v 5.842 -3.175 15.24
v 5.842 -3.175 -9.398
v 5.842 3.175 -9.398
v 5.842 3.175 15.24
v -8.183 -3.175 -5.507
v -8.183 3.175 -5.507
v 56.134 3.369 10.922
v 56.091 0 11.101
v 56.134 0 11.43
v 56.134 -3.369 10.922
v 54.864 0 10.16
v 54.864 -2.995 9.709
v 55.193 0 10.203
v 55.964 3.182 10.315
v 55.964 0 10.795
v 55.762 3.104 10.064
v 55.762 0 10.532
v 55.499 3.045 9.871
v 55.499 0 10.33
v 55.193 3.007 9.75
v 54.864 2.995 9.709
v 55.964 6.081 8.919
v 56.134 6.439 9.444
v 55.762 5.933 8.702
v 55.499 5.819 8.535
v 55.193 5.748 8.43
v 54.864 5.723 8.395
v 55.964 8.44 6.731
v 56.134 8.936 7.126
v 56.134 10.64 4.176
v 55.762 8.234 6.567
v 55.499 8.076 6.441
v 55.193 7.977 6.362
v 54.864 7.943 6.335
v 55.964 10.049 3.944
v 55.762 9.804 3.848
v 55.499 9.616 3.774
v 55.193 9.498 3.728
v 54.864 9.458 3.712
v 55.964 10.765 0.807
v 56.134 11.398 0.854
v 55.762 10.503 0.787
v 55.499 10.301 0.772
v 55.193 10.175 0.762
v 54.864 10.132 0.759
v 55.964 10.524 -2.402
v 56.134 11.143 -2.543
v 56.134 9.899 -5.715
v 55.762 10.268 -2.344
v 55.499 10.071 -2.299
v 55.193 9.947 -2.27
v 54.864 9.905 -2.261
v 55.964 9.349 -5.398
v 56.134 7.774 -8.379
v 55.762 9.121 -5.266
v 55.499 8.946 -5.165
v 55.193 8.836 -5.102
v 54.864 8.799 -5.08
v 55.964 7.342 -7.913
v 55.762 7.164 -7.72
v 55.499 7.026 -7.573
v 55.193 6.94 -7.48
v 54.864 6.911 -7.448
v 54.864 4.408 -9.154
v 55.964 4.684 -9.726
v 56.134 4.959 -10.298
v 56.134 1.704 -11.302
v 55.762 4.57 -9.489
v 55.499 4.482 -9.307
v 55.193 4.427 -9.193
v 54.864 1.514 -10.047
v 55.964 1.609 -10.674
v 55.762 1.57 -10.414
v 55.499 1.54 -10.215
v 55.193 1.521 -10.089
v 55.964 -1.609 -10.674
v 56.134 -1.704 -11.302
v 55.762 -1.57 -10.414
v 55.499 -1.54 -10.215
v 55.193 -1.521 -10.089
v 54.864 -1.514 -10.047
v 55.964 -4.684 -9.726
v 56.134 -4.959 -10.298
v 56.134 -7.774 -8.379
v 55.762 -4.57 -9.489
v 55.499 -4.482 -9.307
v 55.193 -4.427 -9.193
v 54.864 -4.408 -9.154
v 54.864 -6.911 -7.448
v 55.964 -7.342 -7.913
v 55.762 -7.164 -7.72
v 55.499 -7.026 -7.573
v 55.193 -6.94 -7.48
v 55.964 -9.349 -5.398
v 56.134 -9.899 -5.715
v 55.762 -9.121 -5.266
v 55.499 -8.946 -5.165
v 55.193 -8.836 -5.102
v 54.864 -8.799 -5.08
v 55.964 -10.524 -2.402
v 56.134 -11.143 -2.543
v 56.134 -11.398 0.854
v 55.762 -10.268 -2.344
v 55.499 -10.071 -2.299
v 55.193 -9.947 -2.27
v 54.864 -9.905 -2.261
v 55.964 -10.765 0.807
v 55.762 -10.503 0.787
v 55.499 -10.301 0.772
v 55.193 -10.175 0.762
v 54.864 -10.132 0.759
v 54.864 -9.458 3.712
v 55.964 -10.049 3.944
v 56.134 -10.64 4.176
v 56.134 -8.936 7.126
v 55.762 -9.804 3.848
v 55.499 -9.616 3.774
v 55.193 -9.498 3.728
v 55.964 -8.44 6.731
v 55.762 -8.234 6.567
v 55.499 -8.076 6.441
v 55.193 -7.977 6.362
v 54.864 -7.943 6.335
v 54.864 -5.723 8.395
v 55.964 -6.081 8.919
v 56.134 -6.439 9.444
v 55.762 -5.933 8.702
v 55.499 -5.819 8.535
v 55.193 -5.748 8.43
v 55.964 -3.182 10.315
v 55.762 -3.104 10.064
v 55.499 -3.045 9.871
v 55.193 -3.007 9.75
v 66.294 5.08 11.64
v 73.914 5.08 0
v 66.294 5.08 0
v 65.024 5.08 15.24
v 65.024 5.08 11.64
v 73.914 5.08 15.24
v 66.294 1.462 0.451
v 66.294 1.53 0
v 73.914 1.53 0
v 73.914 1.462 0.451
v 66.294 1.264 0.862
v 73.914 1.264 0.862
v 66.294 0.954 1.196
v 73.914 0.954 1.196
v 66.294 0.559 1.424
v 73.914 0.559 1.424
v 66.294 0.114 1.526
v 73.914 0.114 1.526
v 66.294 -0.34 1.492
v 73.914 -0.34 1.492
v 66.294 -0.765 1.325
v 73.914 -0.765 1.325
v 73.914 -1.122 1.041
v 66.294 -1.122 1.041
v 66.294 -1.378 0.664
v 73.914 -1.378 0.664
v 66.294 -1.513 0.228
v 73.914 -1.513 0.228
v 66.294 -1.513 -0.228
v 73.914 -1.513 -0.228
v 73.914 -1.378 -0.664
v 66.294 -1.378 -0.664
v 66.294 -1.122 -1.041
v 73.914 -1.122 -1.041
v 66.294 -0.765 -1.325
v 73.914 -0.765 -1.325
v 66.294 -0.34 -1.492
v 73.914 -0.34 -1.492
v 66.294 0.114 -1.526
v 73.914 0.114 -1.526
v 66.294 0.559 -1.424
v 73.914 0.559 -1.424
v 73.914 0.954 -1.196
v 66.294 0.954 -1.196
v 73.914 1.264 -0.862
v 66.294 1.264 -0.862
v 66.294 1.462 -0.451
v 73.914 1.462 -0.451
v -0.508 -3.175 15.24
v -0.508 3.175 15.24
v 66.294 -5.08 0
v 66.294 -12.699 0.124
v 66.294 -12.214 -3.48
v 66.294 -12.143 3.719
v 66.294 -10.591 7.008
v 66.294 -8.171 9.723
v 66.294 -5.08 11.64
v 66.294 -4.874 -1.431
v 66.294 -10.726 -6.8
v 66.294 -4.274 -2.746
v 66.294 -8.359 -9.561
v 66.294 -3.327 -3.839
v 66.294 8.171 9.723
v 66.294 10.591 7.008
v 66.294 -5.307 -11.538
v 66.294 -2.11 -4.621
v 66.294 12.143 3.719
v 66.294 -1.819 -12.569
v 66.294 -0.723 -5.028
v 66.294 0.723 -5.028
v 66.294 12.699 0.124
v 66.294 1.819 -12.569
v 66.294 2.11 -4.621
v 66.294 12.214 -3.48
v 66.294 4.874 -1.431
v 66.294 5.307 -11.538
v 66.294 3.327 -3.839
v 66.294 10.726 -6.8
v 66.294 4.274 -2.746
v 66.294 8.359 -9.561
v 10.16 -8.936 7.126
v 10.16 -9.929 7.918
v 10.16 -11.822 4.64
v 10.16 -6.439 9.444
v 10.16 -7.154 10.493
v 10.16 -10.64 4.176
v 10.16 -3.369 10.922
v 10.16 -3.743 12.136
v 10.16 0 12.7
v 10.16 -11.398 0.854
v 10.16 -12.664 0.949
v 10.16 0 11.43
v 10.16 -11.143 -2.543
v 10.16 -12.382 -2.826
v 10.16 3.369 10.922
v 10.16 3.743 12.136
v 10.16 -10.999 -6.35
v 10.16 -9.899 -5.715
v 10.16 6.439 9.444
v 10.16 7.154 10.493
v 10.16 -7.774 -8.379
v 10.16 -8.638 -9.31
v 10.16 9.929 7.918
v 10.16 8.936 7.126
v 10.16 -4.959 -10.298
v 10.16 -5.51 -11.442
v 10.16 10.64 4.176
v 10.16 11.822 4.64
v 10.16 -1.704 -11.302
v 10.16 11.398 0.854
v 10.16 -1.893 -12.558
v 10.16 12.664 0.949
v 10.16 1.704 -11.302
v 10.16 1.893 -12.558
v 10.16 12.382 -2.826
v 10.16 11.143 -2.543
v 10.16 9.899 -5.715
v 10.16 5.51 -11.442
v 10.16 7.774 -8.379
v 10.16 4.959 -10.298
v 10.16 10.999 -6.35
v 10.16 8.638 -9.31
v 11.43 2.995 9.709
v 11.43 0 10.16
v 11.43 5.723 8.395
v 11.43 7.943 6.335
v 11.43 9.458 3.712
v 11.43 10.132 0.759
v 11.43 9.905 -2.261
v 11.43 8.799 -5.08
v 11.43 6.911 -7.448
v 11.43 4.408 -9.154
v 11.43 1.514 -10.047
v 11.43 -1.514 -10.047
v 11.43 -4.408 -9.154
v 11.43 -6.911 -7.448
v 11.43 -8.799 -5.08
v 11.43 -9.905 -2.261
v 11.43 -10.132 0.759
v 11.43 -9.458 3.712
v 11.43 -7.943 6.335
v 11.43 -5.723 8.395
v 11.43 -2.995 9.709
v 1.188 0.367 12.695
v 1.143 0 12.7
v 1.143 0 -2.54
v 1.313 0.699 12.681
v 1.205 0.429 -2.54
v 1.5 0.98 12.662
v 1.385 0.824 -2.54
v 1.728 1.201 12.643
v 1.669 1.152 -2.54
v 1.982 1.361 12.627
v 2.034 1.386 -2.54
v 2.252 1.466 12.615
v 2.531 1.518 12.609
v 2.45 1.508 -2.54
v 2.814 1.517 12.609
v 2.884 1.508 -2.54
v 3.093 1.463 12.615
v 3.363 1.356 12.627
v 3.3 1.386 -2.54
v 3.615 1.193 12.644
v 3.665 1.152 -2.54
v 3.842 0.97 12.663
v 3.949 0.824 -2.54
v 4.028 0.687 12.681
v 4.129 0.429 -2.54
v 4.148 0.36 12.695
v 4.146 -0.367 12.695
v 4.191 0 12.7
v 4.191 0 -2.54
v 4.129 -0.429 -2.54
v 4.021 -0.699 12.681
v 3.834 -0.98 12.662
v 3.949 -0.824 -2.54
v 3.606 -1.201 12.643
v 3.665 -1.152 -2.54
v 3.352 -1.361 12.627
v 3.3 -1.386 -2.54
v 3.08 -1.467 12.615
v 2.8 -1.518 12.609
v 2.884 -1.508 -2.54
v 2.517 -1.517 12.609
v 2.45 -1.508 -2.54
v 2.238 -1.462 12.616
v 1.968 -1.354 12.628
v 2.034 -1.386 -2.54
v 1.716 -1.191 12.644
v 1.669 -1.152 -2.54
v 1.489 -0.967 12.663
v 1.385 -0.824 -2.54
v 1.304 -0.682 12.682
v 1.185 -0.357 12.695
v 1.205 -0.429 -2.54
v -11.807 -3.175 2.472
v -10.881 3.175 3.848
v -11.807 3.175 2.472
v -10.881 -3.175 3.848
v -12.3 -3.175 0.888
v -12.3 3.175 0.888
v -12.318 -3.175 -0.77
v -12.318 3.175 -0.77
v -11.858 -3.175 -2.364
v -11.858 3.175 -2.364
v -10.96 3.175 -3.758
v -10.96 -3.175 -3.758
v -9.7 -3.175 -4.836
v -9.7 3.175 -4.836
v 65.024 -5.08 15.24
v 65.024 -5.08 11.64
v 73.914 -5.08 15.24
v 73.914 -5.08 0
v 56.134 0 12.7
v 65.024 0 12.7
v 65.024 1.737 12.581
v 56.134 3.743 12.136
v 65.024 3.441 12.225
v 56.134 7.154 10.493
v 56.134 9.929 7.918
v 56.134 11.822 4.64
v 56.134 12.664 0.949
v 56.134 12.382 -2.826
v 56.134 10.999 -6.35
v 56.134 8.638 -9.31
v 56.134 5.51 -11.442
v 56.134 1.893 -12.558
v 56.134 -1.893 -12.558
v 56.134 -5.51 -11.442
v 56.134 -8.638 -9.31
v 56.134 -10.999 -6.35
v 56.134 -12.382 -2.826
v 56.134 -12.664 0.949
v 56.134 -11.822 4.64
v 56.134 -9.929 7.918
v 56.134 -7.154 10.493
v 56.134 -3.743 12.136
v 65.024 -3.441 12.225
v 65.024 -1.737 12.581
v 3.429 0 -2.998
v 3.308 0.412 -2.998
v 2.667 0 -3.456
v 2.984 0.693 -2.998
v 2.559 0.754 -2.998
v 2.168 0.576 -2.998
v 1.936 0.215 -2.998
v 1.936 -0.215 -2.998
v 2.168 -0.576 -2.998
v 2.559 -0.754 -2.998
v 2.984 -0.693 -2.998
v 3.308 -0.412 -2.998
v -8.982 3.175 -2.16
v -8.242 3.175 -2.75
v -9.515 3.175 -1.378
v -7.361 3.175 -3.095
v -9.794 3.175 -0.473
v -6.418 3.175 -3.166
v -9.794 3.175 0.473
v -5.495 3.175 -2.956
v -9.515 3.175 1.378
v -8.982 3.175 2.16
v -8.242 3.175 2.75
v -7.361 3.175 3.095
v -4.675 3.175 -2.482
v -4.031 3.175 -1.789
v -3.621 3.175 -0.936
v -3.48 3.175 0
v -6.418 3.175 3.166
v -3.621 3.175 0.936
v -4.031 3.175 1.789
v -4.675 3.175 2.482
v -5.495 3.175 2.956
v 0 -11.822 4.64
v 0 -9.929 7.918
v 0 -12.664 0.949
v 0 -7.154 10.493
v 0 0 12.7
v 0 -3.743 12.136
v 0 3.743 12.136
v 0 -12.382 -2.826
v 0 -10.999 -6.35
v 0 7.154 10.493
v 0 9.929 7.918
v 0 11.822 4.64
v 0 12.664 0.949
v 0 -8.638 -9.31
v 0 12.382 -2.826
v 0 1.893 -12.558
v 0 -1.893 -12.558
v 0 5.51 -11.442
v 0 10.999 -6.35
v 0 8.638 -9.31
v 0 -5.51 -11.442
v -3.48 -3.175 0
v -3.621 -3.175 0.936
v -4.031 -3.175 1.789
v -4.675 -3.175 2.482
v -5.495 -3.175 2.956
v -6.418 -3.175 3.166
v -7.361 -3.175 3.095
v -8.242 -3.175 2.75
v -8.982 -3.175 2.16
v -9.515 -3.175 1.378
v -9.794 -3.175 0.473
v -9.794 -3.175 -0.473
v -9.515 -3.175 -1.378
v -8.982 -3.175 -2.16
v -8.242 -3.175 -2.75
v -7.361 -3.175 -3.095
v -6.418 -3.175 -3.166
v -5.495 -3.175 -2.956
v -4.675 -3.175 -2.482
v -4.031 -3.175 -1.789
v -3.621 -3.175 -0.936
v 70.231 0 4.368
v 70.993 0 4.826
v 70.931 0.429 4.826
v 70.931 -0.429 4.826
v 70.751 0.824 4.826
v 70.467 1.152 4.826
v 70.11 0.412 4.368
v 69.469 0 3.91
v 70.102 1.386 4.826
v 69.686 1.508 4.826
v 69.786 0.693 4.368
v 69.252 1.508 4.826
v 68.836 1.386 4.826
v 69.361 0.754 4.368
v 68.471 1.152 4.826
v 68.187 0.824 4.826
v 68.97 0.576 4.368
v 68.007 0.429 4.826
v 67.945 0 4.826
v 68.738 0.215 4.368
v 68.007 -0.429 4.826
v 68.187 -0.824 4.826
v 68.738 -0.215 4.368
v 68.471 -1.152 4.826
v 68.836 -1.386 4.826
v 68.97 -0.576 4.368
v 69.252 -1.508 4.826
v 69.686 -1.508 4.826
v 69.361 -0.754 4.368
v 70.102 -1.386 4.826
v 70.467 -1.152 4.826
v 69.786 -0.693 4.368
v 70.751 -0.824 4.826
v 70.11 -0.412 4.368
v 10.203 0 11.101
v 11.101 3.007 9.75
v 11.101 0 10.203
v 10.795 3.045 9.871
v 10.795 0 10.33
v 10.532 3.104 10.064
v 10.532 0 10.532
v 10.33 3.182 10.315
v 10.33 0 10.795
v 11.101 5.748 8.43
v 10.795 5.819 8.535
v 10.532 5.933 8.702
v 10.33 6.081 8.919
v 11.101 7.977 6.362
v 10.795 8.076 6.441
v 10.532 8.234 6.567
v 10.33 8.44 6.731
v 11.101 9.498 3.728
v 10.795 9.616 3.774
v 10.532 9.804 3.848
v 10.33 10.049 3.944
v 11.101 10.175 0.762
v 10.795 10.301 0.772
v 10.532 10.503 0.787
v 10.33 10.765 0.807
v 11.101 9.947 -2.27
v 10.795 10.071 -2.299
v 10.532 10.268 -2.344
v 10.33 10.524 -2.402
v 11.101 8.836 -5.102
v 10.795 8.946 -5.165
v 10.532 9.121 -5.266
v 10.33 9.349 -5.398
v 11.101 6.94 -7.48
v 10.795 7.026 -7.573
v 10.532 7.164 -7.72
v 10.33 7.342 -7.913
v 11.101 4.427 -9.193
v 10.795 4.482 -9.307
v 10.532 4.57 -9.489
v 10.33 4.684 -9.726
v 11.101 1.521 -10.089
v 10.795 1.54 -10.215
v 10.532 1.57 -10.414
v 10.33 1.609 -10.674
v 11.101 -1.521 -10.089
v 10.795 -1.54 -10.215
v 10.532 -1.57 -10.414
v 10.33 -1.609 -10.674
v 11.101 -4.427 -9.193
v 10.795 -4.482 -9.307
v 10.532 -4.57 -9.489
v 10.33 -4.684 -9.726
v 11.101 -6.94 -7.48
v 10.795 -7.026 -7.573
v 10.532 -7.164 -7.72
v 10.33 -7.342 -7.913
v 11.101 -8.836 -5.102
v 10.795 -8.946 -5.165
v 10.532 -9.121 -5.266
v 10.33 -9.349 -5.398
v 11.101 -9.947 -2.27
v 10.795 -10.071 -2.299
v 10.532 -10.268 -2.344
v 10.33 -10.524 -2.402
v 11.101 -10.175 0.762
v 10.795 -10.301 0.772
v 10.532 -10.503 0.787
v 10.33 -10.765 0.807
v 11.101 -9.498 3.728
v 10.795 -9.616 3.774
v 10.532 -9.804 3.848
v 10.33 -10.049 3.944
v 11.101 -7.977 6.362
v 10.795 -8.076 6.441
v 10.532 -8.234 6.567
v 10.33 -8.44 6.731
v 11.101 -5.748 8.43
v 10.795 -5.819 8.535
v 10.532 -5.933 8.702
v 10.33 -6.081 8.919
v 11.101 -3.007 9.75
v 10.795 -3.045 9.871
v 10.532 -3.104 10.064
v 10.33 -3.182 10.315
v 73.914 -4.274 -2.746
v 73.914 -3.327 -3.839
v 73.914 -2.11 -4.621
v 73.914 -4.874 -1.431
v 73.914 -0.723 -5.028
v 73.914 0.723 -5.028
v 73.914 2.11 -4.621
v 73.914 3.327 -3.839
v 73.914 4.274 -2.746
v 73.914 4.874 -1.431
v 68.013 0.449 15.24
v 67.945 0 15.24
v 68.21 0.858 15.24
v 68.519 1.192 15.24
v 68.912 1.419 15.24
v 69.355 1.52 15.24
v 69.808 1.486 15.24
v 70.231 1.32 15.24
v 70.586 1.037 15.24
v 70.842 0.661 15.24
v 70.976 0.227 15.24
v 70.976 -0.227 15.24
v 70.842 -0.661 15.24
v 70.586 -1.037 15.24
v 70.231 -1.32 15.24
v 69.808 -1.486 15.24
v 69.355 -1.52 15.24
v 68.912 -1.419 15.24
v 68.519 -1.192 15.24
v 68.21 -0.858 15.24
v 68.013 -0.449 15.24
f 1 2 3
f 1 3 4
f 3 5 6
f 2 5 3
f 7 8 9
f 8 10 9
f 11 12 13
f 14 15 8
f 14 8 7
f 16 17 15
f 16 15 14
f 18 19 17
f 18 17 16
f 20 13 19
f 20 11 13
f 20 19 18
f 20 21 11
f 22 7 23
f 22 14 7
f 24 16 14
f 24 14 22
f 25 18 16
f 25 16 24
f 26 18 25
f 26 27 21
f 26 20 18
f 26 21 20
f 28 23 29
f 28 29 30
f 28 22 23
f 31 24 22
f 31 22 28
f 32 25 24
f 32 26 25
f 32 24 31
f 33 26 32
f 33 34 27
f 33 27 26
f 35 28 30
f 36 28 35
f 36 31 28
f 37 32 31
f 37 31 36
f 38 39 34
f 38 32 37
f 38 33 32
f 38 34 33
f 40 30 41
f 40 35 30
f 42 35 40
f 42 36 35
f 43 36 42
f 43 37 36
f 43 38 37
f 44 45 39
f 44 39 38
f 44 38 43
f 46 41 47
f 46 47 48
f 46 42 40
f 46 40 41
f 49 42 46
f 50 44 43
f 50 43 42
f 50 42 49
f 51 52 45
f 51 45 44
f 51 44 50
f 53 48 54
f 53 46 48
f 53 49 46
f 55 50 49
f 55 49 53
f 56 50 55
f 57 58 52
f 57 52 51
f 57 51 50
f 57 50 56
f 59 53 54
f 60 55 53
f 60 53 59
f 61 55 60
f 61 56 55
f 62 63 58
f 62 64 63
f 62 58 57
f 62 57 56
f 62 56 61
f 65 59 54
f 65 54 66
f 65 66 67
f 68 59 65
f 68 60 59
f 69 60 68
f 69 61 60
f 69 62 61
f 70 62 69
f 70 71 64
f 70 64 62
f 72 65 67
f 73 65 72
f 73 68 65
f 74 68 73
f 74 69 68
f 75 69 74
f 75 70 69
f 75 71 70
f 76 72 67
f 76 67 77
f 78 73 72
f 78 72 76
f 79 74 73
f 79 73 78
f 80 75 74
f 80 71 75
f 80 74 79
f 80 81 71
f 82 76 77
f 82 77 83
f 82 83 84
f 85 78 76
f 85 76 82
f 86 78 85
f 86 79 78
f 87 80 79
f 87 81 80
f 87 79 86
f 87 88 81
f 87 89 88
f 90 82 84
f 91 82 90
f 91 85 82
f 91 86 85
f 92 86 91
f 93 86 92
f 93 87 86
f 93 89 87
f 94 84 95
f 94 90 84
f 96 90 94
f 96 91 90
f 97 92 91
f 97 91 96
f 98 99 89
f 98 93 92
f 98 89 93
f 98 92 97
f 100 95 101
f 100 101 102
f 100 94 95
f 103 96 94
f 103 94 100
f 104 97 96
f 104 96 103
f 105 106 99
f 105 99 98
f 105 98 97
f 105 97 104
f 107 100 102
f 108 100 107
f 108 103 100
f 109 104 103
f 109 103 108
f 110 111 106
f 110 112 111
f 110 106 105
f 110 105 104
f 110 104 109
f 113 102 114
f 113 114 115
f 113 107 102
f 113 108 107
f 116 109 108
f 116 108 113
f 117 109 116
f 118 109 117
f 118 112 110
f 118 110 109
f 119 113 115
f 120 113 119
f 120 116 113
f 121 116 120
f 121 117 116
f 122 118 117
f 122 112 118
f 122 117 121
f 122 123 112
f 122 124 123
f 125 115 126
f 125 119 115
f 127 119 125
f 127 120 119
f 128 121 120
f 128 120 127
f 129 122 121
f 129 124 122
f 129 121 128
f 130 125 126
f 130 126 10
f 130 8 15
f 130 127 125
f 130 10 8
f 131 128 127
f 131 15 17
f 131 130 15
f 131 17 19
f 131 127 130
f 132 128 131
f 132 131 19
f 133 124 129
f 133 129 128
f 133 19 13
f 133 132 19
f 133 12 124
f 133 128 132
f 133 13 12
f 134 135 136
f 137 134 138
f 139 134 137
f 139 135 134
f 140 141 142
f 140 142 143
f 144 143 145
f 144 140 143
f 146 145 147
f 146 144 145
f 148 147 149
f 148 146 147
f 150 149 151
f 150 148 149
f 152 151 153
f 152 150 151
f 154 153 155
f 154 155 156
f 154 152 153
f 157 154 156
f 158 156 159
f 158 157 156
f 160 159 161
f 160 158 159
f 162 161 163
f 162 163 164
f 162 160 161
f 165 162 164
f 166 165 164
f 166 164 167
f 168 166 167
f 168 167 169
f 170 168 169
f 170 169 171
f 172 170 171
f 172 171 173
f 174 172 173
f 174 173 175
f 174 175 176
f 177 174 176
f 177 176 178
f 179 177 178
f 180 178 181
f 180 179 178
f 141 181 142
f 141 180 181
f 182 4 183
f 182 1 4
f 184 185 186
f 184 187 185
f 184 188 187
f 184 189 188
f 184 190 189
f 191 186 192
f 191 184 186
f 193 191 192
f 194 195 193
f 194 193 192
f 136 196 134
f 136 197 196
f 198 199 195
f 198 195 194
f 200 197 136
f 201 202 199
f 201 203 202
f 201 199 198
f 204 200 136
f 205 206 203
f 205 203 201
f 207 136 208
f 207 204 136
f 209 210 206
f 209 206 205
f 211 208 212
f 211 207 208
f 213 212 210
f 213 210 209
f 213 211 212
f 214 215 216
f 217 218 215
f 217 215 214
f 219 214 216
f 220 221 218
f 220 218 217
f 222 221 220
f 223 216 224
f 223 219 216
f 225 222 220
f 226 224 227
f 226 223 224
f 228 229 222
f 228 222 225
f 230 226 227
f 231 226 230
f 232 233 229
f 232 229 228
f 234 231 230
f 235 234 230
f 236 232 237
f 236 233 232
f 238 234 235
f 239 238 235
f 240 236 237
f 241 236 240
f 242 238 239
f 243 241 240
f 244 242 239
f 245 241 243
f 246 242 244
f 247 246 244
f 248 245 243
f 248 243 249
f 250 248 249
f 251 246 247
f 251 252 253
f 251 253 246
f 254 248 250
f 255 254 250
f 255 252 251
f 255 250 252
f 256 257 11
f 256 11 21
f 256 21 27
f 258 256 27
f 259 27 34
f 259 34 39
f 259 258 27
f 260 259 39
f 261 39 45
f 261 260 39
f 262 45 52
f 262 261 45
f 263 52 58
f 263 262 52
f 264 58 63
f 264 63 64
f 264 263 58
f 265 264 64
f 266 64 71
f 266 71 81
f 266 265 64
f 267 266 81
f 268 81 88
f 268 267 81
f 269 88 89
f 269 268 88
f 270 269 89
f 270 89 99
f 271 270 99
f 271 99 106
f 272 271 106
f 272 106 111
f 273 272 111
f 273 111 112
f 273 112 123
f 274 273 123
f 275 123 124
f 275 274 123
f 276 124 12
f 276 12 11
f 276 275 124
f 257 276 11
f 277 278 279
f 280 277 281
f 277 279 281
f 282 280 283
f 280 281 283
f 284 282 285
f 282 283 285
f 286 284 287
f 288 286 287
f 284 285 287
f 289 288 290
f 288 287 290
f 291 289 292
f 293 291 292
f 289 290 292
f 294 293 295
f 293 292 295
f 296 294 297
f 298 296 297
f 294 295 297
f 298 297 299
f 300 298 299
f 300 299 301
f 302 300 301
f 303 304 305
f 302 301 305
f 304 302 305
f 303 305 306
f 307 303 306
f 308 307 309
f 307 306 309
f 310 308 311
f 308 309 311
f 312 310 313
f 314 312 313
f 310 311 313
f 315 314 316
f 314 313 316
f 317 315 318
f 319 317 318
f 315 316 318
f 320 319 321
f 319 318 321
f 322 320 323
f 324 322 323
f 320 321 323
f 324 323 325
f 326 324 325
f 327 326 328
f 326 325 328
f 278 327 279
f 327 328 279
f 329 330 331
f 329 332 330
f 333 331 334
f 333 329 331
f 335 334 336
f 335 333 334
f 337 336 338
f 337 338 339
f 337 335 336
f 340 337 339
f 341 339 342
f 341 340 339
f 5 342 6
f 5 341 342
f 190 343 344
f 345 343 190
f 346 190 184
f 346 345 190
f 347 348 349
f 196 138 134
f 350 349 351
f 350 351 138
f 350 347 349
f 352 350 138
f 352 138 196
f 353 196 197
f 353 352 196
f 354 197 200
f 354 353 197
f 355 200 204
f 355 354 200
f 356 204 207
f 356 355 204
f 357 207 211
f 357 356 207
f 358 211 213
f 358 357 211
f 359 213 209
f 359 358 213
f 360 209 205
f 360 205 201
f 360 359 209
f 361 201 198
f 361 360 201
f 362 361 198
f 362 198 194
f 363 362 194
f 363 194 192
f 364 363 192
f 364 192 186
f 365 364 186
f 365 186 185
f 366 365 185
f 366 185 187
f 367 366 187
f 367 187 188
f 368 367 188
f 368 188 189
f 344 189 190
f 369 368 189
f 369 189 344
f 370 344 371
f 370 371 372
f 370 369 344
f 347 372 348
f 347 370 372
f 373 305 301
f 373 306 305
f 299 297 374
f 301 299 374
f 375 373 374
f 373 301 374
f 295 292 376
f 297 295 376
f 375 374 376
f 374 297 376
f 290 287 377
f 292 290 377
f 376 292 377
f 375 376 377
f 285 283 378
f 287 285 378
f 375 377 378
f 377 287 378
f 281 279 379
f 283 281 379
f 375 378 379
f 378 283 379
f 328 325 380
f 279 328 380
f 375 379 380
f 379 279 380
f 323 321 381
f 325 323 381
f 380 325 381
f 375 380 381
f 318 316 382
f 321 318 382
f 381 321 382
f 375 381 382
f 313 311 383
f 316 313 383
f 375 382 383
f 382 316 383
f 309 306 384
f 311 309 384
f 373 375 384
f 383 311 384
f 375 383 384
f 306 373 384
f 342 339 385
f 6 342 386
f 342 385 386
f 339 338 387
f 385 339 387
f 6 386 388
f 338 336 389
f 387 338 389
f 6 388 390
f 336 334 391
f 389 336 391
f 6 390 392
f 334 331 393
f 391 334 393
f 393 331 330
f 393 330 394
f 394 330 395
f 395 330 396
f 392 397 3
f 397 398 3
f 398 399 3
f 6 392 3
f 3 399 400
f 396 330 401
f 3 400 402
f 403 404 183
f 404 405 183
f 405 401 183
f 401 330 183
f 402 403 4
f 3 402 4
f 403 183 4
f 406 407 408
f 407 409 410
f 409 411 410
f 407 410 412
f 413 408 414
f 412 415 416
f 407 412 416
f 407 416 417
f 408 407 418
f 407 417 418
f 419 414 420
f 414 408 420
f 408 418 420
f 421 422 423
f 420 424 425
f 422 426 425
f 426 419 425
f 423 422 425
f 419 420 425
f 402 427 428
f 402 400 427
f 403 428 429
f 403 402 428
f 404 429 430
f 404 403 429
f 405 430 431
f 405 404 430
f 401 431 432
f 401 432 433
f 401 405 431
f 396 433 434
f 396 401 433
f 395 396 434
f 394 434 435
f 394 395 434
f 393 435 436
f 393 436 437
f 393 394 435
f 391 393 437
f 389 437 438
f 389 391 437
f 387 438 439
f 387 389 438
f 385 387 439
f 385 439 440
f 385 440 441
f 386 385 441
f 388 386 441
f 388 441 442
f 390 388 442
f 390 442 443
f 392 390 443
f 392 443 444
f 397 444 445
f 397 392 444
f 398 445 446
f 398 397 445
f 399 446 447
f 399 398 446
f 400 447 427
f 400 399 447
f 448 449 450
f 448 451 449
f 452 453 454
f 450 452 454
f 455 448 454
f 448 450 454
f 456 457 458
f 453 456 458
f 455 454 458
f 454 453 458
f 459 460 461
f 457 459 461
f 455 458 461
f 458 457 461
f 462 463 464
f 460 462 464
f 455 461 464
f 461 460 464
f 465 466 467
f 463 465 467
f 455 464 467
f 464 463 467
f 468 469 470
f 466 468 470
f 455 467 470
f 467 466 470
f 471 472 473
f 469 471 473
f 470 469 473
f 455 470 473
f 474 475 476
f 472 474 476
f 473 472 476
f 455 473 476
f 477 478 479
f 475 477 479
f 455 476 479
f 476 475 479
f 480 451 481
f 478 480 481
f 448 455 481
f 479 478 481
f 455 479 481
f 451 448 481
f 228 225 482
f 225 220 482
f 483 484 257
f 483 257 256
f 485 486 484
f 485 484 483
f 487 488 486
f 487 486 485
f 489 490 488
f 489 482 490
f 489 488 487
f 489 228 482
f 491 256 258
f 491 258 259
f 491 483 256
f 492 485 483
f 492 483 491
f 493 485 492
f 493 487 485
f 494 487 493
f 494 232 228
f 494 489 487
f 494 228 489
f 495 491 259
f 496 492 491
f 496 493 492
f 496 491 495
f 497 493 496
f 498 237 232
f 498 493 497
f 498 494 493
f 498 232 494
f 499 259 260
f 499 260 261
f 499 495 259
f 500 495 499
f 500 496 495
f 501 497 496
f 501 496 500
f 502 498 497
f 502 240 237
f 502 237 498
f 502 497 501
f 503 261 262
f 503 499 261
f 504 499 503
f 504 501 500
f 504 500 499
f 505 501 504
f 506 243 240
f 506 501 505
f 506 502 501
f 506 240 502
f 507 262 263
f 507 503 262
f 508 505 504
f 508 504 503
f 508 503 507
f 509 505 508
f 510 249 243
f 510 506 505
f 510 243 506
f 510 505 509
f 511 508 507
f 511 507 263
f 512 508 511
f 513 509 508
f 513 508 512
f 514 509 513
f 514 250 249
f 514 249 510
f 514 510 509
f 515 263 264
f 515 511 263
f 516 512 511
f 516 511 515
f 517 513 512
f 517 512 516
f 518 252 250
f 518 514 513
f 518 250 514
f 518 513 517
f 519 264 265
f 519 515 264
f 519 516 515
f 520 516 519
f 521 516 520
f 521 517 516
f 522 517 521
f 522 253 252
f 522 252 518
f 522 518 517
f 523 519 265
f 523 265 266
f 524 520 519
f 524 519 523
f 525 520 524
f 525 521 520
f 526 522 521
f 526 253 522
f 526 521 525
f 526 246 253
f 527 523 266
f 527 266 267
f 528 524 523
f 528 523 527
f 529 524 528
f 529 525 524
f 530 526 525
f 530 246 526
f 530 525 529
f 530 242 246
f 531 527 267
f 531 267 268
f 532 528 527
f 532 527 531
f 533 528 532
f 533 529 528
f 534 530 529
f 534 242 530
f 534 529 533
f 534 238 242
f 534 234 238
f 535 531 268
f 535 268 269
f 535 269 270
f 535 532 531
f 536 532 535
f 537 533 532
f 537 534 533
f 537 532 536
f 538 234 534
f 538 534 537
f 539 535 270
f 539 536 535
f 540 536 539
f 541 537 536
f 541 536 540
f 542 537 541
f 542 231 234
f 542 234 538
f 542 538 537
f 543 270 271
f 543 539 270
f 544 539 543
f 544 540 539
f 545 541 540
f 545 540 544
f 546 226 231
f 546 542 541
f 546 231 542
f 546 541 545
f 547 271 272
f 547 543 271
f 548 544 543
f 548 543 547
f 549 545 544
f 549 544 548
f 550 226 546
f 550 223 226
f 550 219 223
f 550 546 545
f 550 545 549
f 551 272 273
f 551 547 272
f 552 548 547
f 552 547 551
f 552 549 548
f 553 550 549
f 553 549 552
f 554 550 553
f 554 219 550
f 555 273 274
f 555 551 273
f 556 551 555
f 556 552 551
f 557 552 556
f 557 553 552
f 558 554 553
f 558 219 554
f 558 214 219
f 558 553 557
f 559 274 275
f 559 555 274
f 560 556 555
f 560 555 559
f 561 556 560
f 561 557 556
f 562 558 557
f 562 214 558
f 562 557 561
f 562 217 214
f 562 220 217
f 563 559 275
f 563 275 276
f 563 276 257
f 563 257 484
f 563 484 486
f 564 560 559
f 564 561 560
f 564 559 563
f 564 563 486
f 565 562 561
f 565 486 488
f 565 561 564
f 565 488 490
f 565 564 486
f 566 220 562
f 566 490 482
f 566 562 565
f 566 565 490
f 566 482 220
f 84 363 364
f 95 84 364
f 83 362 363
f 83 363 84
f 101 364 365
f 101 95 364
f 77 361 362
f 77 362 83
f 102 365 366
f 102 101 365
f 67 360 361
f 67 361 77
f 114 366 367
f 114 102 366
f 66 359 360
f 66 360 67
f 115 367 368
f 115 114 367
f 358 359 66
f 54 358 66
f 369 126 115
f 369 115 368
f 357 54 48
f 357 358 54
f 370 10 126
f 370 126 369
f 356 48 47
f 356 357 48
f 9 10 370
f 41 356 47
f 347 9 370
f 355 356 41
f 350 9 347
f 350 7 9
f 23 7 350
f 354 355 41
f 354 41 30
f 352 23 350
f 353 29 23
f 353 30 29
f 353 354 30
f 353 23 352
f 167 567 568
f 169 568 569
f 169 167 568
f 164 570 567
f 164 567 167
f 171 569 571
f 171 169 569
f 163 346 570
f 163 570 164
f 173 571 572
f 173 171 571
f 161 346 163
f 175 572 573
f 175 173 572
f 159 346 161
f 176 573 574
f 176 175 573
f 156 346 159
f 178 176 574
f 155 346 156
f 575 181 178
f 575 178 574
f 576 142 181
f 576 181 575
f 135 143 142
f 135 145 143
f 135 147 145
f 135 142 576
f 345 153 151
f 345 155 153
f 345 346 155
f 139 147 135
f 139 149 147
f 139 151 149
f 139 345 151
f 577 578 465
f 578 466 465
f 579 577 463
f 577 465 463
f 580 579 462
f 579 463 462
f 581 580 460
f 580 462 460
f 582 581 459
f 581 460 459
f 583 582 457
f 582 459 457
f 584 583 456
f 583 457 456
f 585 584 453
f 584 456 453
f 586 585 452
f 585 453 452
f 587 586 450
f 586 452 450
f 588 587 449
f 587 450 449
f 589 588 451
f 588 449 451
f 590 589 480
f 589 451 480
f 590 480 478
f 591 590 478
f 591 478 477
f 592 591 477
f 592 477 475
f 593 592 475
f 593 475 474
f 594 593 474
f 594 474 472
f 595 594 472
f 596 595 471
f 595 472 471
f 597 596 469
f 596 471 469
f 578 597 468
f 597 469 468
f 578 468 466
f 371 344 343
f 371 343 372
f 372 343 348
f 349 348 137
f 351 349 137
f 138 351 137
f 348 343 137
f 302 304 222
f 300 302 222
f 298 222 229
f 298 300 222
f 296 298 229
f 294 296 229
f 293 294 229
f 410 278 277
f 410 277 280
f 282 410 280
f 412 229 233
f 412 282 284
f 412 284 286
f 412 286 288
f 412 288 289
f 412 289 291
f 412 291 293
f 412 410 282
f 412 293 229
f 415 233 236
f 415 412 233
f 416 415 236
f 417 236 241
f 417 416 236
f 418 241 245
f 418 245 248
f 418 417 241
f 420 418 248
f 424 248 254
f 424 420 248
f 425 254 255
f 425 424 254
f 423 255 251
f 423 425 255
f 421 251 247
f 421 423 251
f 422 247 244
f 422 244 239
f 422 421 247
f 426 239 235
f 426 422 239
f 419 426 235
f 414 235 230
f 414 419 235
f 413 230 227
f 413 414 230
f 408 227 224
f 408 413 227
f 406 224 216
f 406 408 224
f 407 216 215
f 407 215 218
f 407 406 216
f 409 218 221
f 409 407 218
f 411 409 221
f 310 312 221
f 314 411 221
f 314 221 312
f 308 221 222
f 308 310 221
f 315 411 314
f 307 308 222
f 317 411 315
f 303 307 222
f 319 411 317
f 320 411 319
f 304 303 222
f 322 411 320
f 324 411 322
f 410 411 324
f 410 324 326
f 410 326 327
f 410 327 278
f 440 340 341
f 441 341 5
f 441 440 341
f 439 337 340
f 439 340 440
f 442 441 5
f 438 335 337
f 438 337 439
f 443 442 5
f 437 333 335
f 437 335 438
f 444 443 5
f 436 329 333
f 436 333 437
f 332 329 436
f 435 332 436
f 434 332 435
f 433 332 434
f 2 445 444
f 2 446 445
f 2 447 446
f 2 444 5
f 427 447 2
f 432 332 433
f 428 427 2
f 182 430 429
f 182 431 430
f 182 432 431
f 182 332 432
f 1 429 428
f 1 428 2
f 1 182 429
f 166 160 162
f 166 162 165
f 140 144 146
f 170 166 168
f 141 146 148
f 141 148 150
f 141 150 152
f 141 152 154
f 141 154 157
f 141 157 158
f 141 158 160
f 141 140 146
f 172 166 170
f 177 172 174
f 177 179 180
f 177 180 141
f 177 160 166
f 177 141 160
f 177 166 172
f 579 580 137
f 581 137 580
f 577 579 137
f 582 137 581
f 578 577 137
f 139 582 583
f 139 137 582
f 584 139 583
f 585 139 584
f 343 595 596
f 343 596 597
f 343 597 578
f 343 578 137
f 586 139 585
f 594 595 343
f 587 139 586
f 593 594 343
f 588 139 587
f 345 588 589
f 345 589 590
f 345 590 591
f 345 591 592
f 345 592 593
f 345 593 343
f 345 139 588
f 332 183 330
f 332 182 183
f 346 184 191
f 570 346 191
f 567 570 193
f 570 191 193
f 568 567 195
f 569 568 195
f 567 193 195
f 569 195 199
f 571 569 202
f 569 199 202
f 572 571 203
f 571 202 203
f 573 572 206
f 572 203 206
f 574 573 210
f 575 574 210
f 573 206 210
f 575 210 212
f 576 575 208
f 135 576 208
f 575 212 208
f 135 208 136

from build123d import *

# Parameters (mm, degrees)
F0_W          = 5.842
F0_H          = 12.7
F0_R          = 3.175
F2_DEPTH      = 3.175
F3_R          = 1.53
F4_DEPTH      = 7.62
F4_DEPTH_BACK = 1.27
F6_D          = 3.048
F6_DEPTH      = 17.78
F6_TIP        = 0.9157115834
F8_D          = 3.048
F8_DEPTH      = 10.414
F8_TIP        = 0.9157115834
F9_R          = 1.27


with BuildPart() as f1:
    # F0 (on Front) → F1 (revolve)
    with BuildSketch(Plane.XZ):
        Polygon((5.842, 12.7), (5.842, 0), (66.294, 0), (66.294, 12.7), (56.134, 12.7), (56.134, 10.16), (10.16, 10.16), (10.16, 12.7), align=None)
        with Locations((2.921, 6.35)):
            Rectangle(F0_W, F0_H)
    revolve(axis=Axis((33.147, 0, 0), (-1, 0, 0)))

    # F3 (on face) → F4 (join, two sides)
    with BuildSketch(Plane.YZ.offset(66.294)) as f4_sk:
        with BuildLine():
            ThreePointArc((-5.08, 0), (0, -5.08), (5.08, 0))
            ThreePointArc((5.08, 0), (0, 5.08), (-5.08, 0))
        make_face()
        Circle(F3_R, mode=Mode.SUBTRACT)
        with BuildLine():
            ThreePointArc((-5.08, 0), (0, 5.08), (5.08, 0))
            Line((5.08, 0), (5.08, 15.24))
            Line((5.08, 15.24), (-5.08, 15.24))
            Line((-5.08, 15.24), (-5.08, 0))
        make_face()
    extrude(amount=F4_DEPTH)
    extrude(f4_sk.sketch, amount=-F4_DEPTH_BACK)

    # F6
    with Locations(Plane.XY.offset(15.24)):
        with Locations((2.667, 0)):
            Hole(F6_D / 2, depth=F6_DEPTH)
            with Locations((0, 0, -(F6_DEPTH + F6_TIP / 2))):  # 118° drill point
                Cone(0, F6_D / 2, F6_TIP, mode=Mode.SUBTRACT)

    # F8
    with Locations(Plane.XY.offset(15.24)):
        with Locations((69.469, 0)):
            Hole(F8_D / 2, depth=F8_DEPTH)
            with Locations((0, 0, -(F8_DEPTH + F8_TIP / 2))):  # 118° drill point
                Cone(0, F8_D / 2, F8_TIP, mode=Mode.SUBTRACT)

    # F9
    f9_edges = [f1.edges().sort_by_distance(p)[0] for p in [
        (56.134, 0, -10.16),
        (10.16, 0, -10.16),
        (33.147, 0, 10.16),
    ]]
    fillet(f9_edges, radius=F9_R)


with BuildPart() as f2:
    # F0 (on Front) → F2 (new body, symmetric)
    with BuildSketch(Plane.XZ):
        with BuildLine():
            ThreePointArc((-8.1826630726, -5.5069827884), (-3.1957909266, -4.5493385486), (-0.9398, 0))
            ThreePointArc((-0.9398, 0), (-4.5919612295, 5.3297205562), (-10.8806298187, 3.8475430269))
            ThreePointArc((-10.8806298187, 3.8475430269), (-12.1459778134, -1.5837270034), (-8.1826630726, -5.5069827884))
        make_face()
        with Locations((-6.6548, 0)):
            Circle(F0_R, mode=Mode.SUBTRACT)
        with BuildLine():
            Line((5.842, 0), (0, 0))
            Line((0, 0), (-0.9398, 0))
            ThreePointArc((-0.9398, 0), (-3.1957909266, -4.5493385486), (-8.1826630726, -5.5069827884))
            Line((-8.1826630726, -5.5069827884), (5.842, -9.398))
            Line((5.842, -9.398), (5.842, 0))
        make_face()
        with BuildLine():
            Line((-0.9398, 0), (0, 0))
            Line((0, 0), (0, 12.7))
            Line((0, 12.7), (5.842, 12.7))
            Line((5.842, 12.7), (5.842, 15.24))
            Line((5.842, 15.24), (-0.508, 15.24))
            Line((-0.508, 15.24), (-10.8806298187, 3.8475430269))
            ThreePointArc((-10.8806298187, 3.8475430269), (-4.5919612295, 5.3297205562), (-0.9398, 0))
        make_face()
        with Locations((2.921, 6.35)):
            Rectangle(F0_W, F0_H)
    extrude(amount=F2_DEPTH, both=True)


solid = Compound([f1.part, f2.part])
